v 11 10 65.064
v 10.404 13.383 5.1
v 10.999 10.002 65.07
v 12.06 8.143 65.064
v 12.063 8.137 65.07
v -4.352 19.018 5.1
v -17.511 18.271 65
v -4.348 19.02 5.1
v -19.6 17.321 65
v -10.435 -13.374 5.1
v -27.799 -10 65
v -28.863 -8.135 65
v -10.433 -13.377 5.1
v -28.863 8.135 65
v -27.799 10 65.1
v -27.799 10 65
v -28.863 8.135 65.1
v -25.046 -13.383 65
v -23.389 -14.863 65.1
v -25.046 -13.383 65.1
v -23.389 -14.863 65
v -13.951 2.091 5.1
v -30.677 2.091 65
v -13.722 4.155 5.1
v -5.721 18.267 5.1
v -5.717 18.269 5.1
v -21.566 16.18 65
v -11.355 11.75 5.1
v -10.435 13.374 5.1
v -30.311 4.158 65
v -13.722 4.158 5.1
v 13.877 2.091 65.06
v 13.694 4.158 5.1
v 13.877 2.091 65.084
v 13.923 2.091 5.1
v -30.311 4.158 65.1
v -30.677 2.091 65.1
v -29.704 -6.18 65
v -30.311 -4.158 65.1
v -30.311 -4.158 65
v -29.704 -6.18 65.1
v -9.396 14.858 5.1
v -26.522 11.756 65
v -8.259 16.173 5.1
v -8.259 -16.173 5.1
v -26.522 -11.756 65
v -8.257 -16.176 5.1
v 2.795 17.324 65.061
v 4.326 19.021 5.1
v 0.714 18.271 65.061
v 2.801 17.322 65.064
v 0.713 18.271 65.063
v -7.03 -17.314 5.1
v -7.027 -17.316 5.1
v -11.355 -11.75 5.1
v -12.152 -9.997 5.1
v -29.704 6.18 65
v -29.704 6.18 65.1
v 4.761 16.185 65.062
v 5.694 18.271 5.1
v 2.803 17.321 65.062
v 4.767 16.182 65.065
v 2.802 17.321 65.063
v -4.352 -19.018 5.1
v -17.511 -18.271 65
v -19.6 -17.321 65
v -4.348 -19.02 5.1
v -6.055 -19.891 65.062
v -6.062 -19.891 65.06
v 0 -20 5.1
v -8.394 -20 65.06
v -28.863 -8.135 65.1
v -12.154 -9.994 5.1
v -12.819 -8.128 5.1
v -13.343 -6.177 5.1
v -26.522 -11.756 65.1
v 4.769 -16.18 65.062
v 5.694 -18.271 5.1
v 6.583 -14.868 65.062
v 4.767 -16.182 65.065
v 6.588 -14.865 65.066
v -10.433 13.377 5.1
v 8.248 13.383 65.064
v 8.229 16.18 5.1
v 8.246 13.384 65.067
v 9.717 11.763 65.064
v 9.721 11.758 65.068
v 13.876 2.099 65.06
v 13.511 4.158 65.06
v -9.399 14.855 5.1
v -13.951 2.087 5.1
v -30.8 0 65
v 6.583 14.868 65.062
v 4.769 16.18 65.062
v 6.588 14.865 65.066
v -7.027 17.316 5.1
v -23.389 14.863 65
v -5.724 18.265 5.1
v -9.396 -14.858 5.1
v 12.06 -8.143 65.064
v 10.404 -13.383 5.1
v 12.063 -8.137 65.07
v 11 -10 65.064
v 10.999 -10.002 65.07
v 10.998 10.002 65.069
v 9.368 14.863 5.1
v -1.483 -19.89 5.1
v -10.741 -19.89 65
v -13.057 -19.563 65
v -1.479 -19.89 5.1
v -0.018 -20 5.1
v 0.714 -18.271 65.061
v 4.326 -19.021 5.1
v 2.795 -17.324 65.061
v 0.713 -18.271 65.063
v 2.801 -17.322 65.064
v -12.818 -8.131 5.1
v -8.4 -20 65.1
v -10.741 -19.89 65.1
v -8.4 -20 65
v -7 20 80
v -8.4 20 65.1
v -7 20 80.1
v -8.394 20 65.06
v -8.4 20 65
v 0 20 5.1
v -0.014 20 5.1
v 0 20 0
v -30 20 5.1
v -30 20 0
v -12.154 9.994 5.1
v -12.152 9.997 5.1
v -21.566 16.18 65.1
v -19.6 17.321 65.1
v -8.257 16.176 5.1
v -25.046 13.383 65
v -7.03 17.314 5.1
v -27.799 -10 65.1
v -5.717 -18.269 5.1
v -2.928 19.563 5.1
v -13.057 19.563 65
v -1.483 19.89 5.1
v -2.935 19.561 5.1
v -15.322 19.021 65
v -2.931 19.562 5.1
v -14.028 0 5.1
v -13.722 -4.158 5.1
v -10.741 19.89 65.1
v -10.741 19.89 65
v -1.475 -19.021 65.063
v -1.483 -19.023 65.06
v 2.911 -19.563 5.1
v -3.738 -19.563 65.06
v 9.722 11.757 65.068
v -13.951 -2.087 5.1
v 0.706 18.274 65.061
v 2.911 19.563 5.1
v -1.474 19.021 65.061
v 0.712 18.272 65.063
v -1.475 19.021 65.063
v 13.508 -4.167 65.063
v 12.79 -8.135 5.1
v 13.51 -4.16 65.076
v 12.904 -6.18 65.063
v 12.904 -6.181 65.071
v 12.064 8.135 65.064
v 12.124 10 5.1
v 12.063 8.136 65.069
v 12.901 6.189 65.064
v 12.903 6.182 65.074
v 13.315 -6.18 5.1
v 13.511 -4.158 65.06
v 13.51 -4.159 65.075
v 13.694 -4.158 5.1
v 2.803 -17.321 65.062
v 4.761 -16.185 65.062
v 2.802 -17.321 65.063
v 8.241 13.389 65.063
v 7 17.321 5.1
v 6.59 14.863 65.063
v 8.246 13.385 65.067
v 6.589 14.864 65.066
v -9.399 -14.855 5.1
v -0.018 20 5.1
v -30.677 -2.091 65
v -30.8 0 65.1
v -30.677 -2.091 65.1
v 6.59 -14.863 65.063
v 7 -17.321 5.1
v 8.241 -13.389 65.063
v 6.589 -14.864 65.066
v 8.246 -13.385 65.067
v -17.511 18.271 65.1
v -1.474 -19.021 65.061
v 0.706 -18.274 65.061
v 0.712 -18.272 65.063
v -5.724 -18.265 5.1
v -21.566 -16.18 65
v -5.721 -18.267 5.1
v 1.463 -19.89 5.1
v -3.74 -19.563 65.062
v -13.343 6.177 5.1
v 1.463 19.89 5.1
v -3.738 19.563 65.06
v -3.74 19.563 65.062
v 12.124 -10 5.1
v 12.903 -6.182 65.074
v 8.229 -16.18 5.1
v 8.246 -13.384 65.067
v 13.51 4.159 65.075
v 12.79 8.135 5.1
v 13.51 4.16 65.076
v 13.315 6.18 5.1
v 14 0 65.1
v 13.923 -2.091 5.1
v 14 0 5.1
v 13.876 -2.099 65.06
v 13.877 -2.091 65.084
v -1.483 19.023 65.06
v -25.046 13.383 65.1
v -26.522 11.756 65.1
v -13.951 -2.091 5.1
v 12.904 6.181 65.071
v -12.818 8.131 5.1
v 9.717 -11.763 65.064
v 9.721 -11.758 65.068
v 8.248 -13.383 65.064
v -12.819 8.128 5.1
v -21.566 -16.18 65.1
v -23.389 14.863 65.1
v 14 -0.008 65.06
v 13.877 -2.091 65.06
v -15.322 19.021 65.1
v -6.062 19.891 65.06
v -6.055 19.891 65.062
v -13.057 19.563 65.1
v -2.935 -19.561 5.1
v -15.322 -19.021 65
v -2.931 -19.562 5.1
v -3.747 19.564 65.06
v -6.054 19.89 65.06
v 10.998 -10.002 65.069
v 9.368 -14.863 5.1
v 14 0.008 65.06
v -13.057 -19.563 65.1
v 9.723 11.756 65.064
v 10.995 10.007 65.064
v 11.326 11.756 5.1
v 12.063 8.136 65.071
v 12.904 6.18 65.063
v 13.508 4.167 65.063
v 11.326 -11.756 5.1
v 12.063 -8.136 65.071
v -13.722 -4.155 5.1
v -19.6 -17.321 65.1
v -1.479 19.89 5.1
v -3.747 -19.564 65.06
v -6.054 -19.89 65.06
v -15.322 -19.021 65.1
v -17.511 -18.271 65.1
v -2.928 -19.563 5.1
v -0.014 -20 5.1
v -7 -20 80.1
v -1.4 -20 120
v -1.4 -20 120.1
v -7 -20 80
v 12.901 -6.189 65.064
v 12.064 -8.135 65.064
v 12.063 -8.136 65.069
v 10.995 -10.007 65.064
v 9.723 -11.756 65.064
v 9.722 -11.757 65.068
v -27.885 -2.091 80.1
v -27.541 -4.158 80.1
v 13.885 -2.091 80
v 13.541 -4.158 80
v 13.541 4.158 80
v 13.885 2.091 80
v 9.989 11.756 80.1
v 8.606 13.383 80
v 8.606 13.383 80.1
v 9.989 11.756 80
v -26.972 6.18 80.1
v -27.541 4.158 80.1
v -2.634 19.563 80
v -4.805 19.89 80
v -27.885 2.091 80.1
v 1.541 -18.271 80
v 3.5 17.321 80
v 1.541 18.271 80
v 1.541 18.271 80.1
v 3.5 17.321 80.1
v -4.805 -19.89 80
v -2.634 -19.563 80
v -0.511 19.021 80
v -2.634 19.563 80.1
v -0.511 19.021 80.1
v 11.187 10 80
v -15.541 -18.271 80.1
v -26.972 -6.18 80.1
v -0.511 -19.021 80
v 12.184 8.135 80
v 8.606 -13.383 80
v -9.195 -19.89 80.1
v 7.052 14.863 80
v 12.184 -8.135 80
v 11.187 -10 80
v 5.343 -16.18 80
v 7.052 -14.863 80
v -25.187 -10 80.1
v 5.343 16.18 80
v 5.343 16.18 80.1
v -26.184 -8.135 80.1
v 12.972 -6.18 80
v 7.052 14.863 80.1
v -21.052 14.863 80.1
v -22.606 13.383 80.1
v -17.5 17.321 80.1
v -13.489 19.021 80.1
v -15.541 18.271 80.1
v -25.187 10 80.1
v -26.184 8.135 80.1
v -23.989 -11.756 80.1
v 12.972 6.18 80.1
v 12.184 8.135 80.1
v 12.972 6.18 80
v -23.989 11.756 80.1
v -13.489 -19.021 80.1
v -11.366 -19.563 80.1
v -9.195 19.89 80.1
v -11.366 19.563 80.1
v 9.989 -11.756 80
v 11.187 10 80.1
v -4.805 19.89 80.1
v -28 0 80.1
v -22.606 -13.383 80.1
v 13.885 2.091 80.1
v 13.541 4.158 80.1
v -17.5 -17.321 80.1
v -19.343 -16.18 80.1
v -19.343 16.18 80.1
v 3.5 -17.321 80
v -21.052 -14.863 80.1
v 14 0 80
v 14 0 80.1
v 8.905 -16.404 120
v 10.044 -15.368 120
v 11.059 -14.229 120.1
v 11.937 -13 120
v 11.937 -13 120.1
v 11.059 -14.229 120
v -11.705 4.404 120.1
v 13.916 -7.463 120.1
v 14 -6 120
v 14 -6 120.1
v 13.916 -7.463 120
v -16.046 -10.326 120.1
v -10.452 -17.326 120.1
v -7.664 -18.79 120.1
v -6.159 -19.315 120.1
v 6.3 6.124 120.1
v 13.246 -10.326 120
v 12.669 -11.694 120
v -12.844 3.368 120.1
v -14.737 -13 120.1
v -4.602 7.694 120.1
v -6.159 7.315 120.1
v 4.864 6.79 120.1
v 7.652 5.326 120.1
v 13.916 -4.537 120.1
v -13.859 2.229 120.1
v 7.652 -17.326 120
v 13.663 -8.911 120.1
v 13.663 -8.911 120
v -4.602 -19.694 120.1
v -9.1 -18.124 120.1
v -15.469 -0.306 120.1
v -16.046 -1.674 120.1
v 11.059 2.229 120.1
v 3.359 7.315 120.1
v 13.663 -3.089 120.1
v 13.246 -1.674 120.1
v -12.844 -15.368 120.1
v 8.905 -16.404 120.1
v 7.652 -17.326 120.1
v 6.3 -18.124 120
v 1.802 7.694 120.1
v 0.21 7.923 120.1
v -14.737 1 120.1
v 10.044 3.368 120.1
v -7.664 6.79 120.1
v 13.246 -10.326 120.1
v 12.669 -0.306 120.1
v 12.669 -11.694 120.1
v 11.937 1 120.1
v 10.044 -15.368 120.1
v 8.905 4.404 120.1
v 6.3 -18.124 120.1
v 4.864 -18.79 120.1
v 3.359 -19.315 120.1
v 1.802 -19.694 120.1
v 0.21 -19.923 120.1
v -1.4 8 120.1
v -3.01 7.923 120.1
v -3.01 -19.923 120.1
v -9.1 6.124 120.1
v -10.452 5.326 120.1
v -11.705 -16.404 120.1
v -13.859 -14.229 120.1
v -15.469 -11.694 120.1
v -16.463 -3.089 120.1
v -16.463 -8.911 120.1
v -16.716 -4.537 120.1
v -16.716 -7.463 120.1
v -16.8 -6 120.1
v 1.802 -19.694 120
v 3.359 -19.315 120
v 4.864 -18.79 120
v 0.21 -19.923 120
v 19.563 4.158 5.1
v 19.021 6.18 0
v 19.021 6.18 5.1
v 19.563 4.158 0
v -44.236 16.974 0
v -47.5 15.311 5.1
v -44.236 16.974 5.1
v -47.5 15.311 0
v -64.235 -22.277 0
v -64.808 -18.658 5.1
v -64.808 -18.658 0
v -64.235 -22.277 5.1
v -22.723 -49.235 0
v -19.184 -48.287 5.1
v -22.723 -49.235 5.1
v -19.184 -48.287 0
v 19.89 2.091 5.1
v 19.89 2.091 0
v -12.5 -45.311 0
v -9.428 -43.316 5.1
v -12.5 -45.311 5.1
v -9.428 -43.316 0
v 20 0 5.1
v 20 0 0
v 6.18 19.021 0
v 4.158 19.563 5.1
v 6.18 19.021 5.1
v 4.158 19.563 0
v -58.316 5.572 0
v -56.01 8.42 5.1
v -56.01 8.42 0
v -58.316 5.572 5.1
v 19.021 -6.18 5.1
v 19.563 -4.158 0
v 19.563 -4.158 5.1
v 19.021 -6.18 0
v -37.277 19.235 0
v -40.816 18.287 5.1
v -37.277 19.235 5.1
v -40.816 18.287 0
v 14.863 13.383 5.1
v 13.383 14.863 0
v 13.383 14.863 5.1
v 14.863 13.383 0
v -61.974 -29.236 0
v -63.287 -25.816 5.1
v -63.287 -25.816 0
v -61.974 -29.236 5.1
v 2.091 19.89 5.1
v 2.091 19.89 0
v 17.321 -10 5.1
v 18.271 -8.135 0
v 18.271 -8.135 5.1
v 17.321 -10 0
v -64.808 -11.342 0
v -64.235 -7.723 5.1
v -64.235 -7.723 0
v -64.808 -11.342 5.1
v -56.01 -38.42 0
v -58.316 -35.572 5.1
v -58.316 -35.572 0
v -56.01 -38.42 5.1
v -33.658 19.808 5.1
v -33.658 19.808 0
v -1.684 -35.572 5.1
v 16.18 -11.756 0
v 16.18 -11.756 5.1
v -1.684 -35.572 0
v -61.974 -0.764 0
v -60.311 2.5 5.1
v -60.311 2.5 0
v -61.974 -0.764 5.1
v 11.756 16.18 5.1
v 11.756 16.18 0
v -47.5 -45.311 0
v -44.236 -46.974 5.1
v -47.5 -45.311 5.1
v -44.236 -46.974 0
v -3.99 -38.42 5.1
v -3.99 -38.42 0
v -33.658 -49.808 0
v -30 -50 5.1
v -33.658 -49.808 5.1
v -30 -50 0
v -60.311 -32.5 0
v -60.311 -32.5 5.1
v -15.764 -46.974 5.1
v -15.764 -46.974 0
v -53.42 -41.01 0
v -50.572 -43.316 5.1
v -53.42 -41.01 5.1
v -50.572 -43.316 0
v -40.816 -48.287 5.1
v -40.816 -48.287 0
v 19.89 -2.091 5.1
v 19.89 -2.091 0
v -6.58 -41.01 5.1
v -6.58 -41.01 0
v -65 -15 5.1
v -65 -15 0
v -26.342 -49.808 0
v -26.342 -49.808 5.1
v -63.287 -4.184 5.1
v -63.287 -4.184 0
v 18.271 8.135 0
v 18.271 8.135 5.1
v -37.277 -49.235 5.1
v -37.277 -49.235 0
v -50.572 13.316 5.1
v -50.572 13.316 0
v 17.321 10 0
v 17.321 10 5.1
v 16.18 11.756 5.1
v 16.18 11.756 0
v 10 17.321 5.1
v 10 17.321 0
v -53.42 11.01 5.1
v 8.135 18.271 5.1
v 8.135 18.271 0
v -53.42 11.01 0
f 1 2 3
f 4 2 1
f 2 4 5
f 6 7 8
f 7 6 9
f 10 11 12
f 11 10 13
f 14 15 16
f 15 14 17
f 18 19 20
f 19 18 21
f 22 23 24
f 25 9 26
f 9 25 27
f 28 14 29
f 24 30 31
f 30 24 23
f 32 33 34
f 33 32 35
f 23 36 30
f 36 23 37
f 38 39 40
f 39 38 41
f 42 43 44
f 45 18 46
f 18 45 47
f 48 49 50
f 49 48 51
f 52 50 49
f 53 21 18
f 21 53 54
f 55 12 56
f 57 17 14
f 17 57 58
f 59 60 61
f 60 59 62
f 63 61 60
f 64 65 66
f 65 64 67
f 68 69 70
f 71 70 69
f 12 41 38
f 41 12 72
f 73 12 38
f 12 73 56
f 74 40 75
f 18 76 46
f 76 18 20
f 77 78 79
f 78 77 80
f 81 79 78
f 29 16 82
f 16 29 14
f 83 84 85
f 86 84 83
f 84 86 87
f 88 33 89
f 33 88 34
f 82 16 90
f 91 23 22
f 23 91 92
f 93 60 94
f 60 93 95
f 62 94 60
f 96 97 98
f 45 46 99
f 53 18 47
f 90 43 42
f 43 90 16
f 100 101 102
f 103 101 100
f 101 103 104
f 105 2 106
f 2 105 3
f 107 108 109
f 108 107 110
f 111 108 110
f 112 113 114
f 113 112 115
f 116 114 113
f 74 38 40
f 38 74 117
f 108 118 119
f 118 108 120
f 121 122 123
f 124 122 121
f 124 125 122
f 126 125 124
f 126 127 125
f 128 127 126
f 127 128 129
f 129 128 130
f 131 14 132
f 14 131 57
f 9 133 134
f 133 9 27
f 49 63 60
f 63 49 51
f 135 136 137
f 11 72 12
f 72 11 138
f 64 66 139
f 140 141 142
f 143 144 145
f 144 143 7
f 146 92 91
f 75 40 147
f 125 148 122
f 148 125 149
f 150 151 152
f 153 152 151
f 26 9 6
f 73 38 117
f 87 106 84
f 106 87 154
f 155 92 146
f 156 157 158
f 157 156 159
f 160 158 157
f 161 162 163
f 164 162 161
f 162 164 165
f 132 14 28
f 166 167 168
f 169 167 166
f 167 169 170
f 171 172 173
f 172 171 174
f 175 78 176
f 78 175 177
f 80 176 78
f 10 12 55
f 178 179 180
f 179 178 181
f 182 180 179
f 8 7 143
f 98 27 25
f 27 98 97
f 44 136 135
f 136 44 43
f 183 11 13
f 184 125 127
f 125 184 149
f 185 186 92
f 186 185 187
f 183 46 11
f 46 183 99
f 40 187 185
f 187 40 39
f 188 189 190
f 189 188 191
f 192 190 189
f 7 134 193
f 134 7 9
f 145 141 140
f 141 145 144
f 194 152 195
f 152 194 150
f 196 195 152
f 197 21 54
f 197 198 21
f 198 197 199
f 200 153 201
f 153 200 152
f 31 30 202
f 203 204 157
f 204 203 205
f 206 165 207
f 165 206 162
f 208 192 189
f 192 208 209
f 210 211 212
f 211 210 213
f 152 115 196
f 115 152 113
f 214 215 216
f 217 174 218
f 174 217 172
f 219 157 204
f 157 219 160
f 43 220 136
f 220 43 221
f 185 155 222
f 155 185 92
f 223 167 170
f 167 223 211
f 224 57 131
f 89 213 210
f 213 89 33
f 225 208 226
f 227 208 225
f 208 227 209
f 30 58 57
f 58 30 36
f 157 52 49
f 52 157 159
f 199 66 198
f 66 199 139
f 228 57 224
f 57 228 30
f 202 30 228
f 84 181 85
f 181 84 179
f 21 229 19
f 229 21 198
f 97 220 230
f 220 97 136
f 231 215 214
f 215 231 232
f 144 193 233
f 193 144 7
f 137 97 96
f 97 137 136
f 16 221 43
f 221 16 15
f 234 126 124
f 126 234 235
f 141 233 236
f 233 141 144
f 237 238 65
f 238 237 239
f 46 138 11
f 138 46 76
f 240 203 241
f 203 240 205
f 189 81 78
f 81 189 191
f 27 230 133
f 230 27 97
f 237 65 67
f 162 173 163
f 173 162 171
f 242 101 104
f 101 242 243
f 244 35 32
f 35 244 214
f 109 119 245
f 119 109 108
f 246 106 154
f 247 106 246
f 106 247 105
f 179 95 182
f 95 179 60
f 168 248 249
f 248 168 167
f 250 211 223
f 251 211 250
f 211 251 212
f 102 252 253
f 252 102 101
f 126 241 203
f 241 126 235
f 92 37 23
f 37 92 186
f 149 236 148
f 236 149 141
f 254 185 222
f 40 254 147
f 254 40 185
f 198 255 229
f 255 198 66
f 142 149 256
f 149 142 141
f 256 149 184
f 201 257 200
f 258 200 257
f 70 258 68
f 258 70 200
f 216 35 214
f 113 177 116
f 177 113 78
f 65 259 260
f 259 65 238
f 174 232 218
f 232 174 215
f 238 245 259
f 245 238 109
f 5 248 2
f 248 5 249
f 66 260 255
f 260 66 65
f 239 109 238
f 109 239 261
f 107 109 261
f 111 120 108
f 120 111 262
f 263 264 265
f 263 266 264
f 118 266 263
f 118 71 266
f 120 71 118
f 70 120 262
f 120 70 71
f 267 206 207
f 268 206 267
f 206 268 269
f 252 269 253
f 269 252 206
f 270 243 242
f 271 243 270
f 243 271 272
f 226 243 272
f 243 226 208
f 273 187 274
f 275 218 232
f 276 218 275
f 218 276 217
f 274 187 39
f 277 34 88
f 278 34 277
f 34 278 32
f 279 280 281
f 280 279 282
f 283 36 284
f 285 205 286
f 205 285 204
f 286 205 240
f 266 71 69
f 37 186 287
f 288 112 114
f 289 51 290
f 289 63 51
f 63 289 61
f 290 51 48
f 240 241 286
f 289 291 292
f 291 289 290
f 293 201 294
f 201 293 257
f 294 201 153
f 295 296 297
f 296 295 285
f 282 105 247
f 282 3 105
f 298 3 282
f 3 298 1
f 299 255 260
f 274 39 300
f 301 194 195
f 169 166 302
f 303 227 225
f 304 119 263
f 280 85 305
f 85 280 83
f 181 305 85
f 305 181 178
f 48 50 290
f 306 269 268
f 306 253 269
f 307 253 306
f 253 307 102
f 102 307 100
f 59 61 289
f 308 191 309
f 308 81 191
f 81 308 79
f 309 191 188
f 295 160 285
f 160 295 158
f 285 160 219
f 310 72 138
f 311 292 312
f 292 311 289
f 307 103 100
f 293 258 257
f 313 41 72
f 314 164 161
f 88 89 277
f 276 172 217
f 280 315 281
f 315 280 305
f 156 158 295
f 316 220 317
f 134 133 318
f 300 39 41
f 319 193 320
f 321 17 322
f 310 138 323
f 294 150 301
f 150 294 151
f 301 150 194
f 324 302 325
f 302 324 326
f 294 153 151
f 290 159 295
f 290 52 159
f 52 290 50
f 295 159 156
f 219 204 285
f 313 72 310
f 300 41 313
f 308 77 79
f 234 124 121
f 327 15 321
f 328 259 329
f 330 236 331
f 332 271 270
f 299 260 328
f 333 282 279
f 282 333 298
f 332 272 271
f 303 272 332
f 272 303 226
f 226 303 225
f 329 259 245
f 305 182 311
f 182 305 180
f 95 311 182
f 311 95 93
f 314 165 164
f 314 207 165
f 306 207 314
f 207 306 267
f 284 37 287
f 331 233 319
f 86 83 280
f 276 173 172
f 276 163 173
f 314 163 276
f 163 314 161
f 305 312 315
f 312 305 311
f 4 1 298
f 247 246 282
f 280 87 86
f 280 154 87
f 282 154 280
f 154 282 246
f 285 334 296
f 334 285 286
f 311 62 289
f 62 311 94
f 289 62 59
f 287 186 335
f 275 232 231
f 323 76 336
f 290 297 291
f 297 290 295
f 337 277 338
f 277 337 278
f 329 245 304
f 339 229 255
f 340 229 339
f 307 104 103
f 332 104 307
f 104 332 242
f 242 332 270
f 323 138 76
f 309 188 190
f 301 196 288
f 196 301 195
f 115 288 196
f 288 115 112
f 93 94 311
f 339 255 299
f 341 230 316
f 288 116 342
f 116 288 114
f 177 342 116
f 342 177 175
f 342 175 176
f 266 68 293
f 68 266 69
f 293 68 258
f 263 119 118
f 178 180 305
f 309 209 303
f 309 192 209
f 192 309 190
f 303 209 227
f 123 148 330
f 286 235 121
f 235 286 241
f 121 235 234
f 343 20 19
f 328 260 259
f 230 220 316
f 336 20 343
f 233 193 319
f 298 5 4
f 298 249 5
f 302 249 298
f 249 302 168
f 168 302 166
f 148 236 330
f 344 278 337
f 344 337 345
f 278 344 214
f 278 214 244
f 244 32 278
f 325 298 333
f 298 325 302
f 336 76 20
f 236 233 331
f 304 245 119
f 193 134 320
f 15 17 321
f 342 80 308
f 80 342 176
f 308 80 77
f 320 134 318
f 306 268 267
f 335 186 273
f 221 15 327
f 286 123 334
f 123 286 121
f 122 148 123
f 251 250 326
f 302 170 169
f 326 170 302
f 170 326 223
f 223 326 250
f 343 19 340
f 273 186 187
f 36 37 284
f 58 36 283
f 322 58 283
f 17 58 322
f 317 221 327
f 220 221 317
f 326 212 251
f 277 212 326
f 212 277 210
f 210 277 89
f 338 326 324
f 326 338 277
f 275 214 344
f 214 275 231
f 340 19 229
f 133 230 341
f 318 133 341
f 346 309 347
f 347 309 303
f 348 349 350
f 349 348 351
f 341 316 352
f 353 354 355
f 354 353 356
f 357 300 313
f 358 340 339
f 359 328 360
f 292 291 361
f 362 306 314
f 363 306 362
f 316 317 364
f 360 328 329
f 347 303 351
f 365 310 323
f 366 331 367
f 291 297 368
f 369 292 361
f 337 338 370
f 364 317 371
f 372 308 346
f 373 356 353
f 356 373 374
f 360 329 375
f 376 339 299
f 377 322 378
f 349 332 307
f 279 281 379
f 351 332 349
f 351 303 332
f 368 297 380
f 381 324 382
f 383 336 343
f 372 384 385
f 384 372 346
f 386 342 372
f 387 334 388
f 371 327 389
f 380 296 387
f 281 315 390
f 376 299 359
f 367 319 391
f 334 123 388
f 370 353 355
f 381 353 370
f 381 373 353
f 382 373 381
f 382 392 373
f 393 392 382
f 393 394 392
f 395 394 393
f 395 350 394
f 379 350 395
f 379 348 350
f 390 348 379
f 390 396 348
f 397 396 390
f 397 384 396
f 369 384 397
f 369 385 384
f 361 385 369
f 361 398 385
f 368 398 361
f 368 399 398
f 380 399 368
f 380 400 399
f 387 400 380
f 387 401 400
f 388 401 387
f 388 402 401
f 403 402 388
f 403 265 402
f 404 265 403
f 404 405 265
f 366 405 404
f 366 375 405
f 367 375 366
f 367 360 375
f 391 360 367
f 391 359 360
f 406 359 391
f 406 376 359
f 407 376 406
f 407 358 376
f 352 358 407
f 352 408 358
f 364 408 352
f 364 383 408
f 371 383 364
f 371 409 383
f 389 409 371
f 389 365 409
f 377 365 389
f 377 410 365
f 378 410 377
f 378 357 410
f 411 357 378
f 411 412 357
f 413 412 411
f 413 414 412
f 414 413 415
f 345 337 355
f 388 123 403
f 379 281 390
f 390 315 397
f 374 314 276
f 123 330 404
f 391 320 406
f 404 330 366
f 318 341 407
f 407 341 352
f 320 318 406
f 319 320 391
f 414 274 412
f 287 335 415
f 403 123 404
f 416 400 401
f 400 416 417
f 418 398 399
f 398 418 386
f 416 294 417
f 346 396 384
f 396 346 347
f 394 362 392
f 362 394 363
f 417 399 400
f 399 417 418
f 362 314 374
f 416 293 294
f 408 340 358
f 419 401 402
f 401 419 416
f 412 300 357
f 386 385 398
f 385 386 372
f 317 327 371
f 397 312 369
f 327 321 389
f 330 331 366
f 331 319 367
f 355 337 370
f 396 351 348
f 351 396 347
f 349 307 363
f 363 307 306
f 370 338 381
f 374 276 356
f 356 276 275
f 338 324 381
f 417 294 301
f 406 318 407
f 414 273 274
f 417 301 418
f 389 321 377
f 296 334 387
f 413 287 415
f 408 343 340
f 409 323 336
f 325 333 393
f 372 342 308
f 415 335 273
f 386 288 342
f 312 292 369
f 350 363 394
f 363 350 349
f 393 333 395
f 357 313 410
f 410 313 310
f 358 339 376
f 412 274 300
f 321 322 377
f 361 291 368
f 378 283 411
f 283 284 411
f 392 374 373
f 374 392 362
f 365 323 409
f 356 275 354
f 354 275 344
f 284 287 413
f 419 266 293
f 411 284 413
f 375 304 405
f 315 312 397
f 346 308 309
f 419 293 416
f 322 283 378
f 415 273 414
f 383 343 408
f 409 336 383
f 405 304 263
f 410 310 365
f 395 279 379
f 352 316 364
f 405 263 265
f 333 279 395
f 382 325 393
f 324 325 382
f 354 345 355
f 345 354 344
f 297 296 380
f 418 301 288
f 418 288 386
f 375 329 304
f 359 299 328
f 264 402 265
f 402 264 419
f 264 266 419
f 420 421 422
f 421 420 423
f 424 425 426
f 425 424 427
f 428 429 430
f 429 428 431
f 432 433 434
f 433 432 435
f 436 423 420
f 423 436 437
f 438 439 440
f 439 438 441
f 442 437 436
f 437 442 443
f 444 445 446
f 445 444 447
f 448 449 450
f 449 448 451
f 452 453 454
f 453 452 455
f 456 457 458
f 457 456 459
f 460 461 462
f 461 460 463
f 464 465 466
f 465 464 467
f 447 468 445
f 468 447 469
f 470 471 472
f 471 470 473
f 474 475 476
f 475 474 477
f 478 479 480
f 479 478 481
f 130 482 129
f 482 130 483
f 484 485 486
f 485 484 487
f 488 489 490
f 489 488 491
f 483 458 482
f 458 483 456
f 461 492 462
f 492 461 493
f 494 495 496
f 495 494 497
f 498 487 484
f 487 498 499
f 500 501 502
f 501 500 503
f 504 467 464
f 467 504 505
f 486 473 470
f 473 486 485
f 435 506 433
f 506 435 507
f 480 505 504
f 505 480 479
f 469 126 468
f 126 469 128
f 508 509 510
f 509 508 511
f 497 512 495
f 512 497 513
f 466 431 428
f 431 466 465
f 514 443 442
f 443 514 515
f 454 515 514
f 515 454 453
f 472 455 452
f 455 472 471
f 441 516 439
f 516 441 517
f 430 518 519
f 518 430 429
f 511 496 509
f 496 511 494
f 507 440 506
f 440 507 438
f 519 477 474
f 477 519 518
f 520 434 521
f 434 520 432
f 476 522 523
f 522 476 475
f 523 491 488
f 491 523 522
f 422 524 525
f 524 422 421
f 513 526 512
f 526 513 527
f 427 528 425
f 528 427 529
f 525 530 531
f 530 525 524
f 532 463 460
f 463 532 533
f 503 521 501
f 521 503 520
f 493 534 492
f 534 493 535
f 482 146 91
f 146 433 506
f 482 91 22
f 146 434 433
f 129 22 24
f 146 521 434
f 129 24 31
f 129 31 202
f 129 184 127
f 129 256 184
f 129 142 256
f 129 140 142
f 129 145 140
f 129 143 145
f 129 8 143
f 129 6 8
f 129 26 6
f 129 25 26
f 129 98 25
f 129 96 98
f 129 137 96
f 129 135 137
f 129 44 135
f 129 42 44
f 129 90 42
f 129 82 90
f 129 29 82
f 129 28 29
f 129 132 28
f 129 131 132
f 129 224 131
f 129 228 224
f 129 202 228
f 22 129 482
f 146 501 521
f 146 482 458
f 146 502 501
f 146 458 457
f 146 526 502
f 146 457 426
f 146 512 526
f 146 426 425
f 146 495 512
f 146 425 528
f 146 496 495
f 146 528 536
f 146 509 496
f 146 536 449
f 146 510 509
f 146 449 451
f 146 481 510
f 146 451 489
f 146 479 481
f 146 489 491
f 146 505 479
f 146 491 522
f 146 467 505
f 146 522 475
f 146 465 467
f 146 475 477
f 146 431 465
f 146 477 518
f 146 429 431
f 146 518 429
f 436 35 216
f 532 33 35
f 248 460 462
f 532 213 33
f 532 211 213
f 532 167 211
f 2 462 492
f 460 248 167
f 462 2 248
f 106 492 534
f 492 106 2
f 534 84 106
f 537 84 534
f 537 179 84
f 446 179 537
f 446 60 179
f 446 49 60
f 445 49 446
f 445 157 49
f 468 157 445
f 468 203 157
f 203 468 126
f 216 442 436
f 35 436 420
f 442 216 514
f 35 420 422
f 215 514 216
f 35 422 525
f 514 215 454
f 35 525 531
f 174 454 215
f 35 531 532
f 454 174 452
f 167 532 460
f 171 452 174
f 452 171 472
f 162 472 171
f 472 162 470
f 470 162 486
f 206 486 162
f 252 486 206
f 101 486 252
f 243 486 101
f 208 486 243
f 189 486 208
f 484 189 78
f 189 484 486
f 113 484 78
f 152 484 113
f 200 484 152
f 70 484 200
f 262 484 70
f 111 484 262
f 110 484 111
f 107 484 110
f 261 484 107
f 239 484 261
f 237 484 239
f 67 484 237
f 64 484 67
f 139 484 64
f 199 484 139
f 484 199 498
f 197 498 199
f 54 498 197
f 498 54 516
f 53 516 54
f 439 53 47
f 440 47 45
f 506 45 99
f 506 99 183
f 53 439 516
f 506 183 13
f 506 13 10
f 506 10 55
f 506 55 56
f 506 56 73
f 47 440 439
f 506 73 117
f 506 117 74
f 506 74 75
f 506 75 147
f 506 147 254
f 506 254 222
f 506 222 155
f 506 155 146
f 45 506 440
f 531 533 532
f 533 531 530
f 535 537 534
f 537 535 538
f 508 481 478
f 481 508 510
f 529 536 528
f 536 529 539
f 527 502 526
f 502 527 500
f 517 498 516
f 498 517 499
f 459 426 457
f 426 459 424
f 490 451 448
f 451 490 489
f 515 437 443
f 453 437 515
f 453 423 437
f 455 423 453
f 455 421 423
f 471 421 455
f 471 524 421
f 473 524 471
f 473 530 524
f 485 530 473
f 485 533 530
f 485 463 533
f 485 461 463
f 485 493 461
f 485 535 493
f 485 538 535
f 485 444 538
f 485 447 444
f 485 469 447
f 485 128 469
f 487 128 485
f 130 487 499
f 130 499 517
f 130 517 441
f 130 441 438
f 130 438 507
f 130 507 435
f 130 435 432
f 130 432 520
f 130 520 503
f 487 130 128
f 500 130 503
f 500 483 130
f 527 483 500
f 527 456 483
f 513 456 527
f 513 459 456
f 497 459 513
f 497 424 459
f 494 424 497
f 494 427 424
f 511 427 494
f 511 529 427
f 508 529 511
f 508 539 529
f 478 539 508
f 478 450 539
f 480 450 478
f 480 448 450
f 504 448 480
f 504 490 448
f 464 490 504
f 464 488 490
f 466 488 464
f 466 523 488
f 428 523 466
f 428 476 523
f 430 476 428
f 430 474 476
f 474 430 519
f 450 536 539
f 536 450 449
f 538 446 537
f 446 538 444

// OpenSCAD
$fn = 60;

// Module 1: De asymmetrische basis
module basis_vorm() {
    rotate([0, 0, 180]) {
        hull() {
            translate([0, 0, 0]) circle(r=20);
            translate([30, 15, 0]) circle(r=35);
        }
    }
}

// Module 2: De ovale schijf
module ovale_schijf(straal) {
    scale([0.7, 1.0, 1]) circle(r=straal);
}

// --- CONFIGURATIE ---
straal_onder = 20;
x_schaal_ovaal = 0.7;
hoogte_deel_1 = 60;
hoogte_deel_2 = 15;
hoogte_deel_3 = 40; 

breedte_factor_max = 1.6;
breedte_factor_eind_d2 = 1.5;
breedte_factor_top_d3 = 1.1; 

y_schaal_top = 0.7; // Schijf wordt dunner op de Y-as
y_offset_top = -6;  // VERSCHUIIVING NAAR ACHTEREN (-Y)

// Berekeningen voor verticale rechterkant
verschuiving_x_max = -((straal_onder * x_schaal_ovaal * breedte_factor_max) - (straal_onder * x_schaal_ovaal));
verschuiving_x_eind_d2 = -((straal_onder * x_schaal_ovaal * breedte_factor_eind_d2) - (straal_onder * x_schaal_ovaal));
verschuiving_x_top_d3 = -((straal_onder * x_schaal_ovaal * breedte_factor_top_d3) - (straal_onder * x_schaal_ovaal));

// --- DE CONSTRUCTIE ---

// 1. De basisvorm
color("SteelBlue")
linear_extrude(height = 5.1) 
    basis_vorm();

translate([0, 0, 5]) {
    // 2. Deel 1: Uitlopend (0-60mm)
    color("Crimson")
    hull() {
        linear_extrude(height = 0.1) 
            ovale_schijf(straal = straal_onder);
        
        translate([verschuiving_x_max, 0, hoogte_deel_1]) 
            scale([breedte_factor_max, 1, 1]) 
                linear_extrude(height = 0.1)
                    ovale_schijf(straal = straal_onder);
    }

    // 3. Deel 2: Naar binnen komend (60-75mm)
    color("FireBrick")
    translate([0, 0, hoogte_deel_1]) {
        hull() {
            translate([verschuiving_x_max, 0, 0]) 
                scale([breedte_factor_max, 1, 1]) 
                    linear_extrude(height = 0.1)
                        ovale_schijf(straal = straal_onder);
            
            translate([verschuiving_x_eind_d2, 0, hoogte_deel_2]) 
                scale([breedte_factor_eind_d2, 1, 1]) 
                    linear_extrude(height = 0.1)
                        ovale_schijf(straal = straal_onder);
        }
    }

    // 4. Deel 3: Naar binnen (X), naar binnen (Voor/Y+) en naar achteren (-Y)
    color("Orange")
    translate([0, 0, hoogte_deel_1 + hoogte_deel_2]) {
        hull() {
            // Start (sluit aan op deel 2)
            translate([verschuiving_x_eind_d2, 0, 0]) 
                scale([breedte_factor_eind_d2, 1, 1]) 
                    linear_extrude(height = 0.1)
                        ovale_schijf(straal = straal_onder);
            
            // Top (verschoven naar -Y)
            translate([verschuiving_x_top_d3, y_offset_top, hoogte_deel_3]) 
                scale([breedte_factor_top_d3, y_schaal_top, 1]) 
                    linear_extrude(height = 0.1)
                        ovale_schijf(straal = straal_onder);
        }
    }
}
